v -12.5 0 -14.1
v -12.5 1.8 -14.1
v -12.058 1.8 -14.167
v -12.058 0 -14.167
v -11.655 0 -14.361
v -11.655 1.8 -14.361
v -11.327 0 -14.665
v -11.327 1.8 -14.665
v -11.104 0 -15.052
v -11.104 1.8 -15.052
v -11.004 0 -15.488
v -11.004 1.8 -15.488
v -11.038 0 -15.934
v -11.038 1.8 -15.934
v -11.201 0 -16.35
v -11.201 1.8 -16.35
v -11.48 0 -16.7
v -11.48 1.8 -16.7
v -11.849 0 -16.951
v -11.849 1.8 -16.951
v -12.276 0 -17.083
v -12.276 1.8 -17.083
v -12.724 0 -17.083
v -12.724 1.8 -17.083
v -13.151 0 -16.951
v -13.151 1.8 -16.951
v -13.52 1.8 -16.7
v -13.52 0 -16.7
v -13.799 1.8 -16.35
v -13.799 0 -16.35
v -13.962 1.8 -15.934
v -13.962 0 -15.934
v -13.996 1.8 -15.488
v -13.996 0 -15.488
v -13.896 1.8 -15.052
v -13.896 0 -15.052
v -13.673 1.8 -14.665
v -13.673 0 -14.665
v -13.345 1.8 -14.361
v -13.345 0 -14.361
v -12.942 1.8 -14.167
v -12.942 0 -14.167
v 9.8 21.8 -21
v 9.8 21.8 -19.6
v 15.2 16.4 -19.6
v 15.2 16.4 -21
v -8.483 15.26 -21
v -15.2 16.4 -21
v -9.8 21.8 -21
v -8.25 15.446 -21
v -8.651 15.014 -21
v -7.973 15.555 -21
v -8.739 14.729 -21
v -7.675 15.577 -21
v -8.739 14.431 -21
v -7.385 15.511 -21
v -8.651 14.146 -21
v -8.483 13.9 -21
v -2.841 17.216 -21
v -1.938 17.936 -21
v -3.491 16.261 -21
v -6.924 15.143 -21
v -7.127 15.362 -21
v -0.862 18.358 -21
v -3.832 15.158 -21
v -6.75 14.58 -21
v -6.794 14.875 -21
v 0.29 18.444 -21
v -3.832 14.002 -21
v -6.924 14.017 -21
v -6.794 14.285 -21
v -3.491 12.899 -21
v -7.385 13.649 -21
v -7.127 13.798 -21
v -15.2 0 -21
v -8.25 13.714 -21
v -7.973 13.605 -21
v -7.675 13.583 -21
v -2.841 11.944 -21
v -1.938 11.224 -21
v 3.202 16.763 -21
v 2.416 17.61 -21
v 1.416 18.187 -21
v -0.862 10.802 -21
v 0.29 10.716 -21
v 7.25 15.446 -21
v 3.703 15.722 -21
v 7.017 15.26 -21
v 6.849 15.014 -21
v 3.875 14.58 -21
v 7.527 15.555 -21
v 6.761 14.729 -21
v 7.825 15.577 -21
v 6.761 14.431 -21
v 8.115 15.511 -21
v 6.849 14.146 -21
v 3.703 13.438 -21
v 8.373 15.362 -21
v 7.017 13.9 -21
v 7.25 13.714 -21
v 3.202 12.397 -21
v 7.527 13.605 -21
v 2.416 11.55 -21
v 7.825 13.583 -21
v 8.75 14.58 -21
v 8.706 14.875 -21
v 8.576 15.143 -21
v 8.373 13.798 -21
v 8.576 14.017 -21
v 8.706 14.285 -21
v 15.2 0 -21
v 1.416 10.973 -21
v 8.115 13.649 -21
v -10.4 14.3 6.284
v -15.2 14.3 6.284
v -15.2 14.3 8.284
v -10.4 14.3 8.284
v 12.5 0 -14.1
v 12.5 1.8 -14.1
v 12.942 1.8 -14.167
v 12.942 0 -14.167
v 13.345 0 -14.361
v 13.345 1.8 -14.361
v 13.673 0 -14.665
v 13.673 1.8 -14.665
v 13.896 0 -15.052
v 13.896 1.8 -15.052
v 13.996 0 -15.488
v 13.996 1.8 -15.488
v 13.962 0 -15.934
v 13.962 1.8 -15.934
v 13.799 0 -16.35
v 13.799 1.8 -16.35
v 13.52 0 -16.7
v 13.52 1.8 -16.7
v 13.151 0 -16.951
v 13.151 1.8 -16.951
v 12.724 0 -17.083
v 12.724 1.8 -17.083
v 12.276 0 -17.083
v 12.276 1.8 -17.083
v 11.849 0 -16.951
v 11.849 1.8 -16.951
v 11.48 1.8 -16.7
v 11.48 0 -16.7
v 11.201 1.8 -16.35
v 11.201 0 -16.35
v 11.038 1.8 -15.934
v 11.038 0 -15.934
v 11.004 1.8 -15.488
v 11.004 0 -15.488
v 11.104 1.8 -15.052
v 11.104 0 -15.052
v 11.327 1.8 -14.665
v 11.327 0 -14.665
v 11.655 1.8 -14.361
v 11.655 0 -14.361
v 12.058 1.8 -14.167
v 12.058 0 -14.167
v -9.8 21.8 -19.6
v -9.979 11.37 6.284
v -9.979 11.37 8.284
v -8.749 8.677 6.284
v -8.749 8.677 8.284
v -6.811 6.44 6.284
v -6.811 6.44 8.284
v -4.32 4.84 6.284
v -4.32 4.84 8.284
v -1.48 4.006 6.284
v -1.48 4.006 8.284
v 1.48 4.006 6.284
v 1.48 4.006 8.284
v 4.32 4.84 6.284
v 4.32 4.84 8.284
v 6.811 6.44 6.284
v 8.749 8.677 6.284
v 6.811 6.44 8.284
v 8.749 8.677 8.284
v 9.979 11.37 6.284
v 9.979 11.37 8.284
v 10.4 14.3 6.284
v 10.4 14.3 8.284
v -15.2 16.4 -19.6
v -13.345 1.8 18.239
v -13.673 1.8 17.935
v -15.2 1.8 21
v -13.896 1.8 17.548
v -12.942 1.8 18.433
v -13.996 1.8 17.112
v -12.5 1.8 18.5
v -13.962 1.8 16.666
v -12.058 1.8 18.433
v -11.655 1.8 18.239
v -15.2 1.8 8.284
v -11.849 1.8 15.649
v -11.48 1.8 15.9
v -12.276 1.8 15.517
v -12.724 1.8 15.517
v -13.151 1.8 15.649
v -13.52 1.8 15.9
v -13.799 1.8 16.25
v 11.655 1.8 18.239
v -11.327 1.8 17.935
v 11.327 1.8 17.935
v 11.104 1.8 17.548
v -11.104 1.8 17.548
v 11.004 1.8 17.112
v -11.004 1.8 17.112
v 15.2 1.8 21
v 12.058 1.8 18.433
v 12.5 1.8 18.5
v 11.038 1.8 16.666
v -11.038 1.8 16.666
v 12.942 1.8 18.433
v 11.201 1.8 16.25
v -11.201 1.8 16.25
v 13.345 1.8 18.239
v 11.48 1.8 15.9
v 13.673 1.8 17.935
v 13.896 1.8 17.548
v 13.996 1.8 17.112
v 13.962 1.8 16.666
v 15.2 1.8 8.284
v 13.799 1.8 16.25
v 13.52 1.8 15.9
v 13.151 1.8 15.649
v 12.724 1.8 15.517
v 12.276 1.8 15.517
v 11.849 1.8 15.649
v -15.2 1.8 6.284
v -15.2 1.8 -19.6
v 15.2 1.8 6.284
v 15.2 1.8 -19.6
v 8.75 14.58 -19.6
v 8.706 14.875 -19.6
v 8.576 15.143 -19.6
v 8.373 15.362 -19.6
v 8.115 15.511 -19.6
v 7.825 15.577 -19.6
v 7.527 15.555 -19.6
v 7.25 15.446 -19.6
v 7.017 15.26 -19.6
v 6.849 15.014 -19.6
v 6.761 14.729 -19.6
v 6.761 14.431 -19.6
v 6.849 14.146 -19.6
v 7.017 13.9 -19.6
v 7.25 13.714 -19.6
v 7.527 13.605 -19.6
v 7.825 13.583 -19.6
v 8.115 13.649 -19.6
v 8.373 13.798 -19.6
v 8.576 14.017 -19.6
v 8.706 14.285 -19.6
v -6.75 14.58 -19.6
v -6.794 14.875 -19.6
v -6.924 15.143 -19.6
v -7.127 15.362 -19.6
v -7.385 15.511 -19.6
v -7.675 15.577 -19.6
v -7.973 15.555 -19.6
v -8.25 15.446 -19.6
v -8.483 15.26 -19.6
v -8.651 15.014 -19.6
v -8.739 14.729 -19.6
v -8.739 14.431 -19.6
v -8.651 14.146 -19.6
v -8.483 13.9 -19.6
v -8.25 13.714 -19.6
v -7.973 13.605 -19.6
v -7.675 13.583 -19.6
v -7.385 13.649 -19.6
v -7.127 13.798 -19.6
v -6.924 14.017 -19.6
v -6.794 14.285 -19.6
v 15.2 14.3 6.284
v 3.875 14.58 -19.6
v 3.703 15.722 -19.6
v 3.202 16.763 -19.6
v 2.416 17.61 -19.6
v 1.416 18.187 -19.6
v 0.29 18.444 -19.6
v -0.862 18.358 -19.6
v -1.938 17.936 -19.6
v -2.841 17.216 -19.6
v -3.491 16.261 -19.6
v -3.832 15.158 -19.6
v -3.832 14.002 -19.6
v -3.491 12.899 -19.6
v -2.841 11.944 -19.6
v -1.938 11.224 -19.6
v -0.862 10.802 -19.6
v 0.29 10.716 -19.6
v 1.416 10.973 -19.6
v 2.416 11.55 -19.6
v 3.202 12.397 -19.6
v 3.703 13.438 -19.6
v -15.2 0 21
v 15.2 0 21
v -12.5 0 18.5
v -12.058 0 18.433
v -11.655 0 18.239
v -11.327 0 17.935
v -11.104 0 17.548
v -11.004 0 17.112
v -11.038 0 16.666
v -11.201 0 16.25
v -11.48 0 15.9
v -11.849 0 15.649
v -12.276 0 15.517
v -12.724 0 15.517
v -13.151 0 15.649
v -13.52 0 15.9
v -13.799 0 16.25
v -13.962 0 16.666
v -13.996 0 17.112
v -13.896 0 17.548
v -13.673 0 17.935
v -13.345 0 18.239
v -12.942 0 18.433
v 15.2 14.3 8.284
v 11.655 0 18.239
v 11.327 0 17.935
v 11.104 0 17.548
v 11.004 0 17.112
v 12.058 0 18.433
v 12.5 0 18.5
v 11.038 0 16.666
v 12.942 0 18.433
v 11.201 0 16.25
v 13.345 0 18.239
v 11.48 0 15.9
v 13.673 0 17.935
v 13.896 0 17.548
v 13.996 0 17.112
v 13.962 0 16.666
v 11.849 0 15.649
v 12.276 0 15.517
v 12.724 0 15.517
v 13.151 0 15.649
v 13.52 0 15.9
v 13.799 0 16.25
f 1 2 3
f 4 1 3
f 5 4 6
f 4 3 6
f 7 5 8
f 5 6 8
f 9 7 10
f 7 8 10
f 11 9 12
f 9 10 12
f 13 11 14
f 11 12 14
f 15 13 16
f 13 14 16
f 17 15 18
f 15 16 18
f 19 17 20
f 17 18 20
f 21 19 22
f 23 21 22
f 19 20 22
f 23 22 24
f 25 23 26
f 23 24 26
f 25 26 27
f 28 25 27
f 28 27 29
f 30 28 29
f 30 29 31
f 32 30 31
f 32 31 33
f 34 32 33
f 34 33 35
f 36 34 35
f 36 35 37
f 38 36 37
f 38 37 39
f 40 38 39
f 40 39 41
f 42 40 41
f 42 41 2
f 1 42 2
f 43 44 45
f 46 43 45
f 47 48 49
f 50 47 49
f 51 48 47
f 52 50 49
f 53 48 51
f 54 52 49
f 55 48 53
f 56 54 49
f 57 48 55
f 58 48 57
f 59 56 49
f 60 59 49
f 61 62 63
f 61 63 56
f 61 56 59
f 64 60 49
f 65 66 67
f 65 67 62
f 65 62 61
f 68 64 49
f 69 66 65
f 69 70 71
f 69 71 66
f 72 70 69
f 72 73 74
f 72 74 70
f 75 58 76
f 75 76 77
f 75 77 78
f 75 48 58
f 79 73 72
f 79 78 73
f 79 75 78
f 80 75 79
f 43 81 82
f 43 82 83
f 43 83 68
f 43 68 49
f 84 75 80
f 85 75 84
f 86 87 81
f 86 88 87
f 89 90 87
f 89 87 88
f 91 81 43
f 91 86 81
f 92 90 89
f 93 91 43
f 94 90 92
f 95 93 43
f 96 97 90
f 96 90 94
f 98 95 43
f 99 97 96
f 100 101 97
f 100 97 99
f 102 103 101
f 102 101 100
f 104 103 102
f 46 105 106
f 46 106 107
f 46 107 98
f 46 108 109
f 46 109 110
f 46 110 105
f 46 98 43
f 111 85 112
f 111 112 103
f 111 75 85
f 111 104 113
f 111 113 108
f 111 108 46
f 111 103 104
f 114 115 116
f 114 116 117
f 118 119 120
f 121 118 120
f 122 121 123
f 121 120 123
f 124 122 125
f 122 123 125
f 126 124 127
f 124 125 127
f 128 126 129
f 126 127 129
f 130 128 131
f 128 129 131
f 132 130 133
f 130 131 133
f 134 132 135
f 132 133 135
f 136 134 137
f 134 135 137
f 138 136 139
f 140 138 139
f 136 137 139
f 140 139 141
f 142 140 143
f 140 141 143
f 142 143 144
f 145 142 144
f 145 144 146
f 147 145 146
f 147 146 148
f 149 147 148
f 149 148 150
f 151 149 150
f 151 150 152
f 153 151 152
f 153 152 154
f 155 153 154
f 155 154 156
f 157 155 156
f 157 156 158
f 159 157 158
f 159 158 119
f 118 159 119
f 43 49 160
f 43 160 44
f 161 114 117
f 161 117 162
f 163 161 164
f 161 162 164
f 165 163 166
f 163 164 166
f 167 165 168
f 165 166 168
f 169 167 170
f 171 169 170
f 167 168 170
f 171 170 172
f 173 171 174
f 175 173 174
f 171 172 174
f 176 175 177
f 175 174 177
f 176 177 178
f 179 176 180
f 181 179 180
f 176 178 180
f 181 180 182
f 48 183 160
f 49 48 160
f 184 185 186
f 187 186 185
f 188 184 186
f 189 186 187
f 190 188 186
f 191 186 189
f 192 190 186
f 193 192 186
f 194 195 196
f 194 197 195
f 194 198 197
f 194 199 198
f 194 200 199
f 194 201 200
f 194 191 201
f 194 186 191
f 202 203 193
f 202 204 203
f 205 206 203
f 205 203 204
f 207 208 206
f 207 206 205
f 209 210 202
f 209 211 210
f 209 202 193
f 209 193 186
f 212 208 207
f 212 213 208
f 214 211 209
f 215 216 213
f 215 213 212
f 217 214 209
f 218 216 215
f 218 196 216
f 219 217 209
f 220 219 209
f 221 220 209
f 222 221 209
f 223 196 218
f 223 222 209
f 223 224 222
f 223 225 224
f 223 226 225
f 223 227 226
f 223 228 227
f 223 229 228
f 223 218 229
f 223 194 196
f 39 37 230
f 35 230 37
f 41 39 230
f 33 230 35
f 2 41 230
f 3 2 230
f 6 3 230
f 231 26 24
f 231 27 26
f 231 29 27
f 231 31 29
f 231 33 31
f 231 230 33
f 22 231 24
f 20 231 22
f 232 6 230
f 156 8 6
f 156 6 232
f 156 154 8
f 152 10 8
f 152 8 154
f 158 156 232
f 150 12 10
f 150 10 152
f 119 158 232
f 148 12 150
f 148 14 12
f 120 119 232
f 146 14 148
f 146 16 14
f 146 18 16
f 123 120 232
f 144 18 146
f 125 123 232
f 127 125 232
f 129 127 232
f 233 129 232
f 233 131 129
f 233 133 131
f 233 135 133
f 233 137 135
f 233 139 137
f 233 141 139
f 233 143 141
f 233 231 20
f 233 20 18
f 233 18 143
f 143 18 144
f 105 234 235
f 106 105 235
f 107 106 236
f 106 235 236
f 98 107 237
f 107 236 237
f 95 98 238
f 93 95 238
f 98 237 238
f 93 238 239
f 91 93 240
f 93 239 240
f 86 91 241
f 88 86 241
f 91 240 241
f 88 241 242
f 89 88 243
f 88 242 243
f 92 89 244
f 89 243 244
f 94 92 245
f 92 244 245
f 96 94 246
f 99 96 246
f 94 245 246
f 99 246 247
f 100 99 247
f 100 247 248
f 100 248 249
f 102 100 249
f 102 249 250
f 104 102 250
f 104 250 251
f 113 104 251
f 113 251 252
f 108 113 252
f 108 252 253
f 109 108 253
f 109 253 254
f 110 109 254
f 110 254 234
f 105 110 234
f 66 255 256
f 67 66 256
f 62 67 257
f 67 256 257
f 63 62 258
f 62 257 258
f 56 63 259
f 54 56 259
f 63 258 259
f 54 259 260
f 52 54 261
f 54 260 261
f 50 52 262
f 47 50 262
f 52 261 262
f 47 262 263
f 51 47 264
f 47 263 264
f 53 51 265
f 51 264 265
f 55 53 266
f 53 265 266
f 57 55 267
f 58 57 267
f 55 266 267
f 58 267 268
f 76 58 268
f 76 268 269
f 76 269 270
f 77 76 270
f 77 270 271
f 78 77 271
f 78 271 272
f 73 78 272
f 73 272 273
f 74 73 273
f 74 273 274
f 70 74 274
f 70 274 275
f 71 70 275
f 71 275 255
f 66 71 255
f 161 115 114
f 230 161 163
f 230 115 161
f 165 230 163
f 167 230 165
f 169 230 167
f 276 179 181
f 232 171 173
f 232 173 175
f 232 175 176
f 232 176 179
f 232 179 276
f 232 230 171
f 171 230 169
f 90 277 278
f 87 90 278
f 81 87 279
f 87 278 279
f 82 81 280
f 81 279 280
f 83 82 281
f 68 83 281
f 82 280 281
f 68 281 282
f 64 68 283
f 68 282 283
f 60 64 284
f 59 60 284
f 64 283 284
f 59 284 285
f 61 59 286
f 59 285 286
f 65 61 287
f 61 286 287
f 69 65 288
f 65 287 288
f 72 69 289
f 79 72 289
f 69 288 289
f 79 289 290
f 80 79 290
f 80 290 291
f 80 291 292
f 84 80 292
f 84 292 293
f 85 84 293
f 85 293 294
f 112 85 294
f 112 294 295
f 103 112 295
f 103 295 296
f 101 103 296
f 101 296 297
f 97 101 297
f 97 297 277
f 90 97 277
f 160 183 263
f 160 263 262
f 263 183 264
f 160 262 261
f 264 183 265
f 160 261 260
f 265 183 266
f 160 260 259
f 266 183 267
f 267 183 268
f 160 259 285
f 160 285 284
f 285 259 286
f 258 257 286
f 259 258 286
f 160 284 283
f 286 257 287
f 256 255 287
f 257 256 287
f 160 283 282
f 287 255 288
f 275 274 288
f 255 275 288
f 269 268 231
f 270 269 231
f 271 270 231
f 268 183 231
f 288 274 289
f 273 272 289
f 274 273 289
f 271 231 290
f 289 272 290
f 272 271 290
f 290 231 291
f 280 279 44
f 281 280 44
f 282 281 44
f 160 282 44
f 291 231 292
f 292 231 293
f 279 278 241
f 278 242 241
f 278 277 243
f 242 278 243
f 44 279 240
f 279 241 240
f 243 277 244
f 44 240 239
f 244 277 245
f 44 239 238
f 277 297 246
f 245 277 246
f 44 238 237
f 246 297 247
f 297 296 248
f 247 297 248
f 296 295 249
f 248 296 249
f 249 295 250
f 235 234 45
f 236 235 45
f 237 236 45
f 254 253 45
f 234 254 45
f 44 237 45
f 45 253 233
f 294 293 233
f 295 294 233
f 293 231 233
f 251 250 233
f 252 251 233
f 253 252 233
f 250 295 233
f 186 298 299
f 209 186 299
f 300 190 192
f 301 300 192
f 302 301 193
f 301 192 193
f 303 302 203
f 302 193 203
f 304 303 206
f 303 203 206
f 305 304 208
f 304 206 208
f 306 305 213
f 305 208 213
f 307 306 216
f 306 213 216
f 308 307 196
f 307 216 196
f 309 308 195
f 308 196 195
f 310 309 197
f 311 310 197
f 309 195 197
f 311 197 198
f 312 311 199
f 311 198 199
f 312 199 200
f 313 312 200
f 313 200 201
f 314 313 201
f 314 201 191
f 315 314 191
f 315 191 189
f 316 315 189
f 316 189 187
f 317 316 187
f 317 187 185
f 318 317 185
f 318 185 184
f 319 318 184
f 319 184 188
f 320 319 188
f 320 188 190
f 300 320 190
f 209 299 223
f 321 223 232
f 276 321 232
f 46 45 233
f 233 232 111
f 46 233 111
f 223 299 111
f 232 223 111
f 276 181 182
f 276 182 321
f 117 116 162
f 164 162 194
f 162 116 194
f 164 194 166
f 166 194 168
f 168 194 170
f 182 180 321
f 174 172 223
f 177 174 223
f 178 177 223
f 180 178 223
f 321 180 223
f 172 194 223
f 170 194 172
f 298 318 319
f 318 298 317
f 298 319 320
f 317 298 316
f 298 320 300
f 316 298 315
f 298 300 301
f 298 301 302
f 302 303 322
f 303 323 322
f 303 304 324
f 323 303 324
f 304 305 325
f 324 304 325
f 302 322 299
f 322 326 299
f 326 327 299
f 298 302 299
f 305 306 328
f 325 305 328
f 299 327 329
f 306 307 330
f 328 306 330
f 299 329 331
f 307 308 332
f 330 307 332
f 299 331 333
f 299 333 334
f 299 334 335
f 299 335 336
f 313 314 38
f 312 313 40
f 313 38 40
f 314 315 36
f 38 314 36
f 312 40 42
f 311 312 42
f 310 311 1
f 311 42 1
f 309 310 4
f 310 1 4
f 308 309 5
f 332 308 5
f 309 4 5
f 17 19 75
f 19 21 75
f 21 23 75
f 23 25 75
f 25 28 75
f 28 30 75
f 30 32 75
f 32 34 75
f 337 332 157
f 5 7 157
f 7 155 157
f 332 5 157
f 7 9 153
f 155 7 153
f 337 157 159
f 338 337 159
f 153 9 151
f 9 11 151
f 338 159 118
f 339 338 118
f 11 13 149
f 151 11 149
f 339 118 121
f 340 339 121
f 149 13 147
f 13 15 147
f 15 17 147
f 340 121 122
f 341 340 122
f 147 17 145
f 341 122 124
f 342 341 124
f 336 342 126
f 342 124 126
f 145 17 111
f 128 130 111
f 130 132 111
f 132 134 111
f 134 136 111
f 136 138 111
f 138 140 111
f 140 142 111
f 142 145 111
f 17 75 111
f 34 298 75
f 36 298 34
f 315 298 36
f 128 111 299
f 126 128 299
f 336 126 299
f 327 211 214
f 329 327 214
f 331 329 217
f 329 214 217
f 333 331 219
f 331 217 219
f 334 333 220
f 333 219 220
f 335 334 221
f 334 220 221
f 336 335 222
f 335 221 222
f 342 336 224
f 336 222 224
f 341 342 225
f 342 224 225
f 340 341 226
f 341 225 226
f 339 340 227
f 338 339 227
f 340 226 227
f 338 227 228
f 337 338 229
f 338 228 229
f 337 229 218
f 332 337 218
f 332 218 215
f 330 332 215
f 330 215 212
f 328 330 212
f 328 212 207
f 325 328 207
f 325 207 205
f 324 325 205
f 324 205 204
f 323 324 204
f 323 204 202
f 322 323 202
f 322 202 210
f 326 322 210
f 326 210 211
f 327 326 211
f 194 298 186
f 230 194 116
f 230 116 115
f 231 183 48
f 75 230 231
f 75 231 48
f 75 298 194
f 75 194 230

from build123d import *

# Parameters (mm, degrees)
SKETCH1_W           = 30.4
SKETCH1_H           = 42
BOSS_EXTRUDE1_DEPTH = 1.8
SKETCH2_W           = 30.4
SKETCH2_H           = 1.4
BOSS_EXTRUDE2_DEPTH = 20
SKETCH3_R           = 1.5
CUT_EXTRUDE1_DEPTH  = 20
SKETCH4_R           = 3.875
SKETCH4_R_2         = 1
CUT_EXTRUDE2_DEPTH  = 20
SKETCH5_W           = 30.4
SKETCH5_H           = 2
BOSS_EXTRUDE3_DEPTH = 12.5
SKETCH6_R           = 10.4
CUT_EXTRUDE3_DEPTH  = 10


with BuildPart() as part:
    # Sketch1 → Boss-Extrude1 (new body)
    with BuildSketch(Plane(origin=(0, 0, 0), x_dir=(1, 0, 0), z_dir=(0, 1, 0))):
        Rectangle(SKETCH1_W, SKETCH1_H)
    extrude(amount=BOSS_EXTRUDE1_DEPTH)

    # Sketch2 → Boss-Extrude2 (add)
    with BuildSketch(Plane(origin=(0, 1.8, 0), x_dir=(1, 0, 0), z_dir=(0, 1, 0))):
        with Locations((0, 20.3)):
            Rectangle(SKETCH2_W, SKETCH2_H)
    extrude(amount=BOSS_EXTRUDE2_DEPTH)

    # Sketch3 → Cut-Extrude1 (cut)
    with BuildSketch(Plane(origin=(0, 1.8, 0), x_dir=(1, 0, 0), z_dir=(0, 1, 0))):
        with Locations(Location((12.5, 15.6, 0), (0, 0, 270))):
            Circle(SKETCH3_R)
        with Locations(Location((-12.5, 15.6, 0), (0, 0, 270))):
            Circle(SKETCH3_R)
        with Locations(Location((-12.5, -17, 0), (0, 0, 270))):
            Circle(SKETCH3_R)
        with Locations(Location((12.5, -17, 0), (0, 0, 270))):
            Circle(SKETCH3_R)
    extrude(amount=-CUT_EXTRUDE1_DEPTH, mode=Mode.SUBTRACT)

    # Sketch4 → Cut-Extrude2 (cut)
    with BuildSketch(Plane.XY.offset(-19.6)):
        with Locations((0, 14.58)):
            Circle(SKETCH4_R)
        with Locations((-7.75, 14.58)):
            Circle(SKETCH4_R_2)
        with Locations((7.75, 14.58)):
            Circle(SKETCH4_R_2)
        Polygon((-15.2, 16.4), (-9.8, 21.8), (-15.2, 21.8), align=None)
        Polygon((15.2, 16.4), (15.2, 21.8), (9.8, 21.8), align=None)
    extrude(amount=-CUT_EXTRUDE2_DEPTH, mode=Mode.SUBTRACT)

    # Sketch5 → Boss-Extrude3 (add)
    with BuildSketch(Plane(origin=(0, 1.8, 0), x_dir=(1, 0, 0), z_dir=(0, 1, 0))):
        with Locations((0, -7.283746966)):
            Rectangle(SKETCH5_W, SKETCH5_H)
    extrude(amount=BOSS_EXTRUDE3_DEPTH)

    # Sketch6 → Cut-Extrude3 (cut)
    with BuildSketch(Plane.XY.offset(8.283746966)):
        with Locations((0, 14.3)):
            Circle(SKETCH6_R)
    extrude(amount=-CUT_EXTRUDE3_DEPTH, mode=Mode.SUBTRACT)


solid = part.part
